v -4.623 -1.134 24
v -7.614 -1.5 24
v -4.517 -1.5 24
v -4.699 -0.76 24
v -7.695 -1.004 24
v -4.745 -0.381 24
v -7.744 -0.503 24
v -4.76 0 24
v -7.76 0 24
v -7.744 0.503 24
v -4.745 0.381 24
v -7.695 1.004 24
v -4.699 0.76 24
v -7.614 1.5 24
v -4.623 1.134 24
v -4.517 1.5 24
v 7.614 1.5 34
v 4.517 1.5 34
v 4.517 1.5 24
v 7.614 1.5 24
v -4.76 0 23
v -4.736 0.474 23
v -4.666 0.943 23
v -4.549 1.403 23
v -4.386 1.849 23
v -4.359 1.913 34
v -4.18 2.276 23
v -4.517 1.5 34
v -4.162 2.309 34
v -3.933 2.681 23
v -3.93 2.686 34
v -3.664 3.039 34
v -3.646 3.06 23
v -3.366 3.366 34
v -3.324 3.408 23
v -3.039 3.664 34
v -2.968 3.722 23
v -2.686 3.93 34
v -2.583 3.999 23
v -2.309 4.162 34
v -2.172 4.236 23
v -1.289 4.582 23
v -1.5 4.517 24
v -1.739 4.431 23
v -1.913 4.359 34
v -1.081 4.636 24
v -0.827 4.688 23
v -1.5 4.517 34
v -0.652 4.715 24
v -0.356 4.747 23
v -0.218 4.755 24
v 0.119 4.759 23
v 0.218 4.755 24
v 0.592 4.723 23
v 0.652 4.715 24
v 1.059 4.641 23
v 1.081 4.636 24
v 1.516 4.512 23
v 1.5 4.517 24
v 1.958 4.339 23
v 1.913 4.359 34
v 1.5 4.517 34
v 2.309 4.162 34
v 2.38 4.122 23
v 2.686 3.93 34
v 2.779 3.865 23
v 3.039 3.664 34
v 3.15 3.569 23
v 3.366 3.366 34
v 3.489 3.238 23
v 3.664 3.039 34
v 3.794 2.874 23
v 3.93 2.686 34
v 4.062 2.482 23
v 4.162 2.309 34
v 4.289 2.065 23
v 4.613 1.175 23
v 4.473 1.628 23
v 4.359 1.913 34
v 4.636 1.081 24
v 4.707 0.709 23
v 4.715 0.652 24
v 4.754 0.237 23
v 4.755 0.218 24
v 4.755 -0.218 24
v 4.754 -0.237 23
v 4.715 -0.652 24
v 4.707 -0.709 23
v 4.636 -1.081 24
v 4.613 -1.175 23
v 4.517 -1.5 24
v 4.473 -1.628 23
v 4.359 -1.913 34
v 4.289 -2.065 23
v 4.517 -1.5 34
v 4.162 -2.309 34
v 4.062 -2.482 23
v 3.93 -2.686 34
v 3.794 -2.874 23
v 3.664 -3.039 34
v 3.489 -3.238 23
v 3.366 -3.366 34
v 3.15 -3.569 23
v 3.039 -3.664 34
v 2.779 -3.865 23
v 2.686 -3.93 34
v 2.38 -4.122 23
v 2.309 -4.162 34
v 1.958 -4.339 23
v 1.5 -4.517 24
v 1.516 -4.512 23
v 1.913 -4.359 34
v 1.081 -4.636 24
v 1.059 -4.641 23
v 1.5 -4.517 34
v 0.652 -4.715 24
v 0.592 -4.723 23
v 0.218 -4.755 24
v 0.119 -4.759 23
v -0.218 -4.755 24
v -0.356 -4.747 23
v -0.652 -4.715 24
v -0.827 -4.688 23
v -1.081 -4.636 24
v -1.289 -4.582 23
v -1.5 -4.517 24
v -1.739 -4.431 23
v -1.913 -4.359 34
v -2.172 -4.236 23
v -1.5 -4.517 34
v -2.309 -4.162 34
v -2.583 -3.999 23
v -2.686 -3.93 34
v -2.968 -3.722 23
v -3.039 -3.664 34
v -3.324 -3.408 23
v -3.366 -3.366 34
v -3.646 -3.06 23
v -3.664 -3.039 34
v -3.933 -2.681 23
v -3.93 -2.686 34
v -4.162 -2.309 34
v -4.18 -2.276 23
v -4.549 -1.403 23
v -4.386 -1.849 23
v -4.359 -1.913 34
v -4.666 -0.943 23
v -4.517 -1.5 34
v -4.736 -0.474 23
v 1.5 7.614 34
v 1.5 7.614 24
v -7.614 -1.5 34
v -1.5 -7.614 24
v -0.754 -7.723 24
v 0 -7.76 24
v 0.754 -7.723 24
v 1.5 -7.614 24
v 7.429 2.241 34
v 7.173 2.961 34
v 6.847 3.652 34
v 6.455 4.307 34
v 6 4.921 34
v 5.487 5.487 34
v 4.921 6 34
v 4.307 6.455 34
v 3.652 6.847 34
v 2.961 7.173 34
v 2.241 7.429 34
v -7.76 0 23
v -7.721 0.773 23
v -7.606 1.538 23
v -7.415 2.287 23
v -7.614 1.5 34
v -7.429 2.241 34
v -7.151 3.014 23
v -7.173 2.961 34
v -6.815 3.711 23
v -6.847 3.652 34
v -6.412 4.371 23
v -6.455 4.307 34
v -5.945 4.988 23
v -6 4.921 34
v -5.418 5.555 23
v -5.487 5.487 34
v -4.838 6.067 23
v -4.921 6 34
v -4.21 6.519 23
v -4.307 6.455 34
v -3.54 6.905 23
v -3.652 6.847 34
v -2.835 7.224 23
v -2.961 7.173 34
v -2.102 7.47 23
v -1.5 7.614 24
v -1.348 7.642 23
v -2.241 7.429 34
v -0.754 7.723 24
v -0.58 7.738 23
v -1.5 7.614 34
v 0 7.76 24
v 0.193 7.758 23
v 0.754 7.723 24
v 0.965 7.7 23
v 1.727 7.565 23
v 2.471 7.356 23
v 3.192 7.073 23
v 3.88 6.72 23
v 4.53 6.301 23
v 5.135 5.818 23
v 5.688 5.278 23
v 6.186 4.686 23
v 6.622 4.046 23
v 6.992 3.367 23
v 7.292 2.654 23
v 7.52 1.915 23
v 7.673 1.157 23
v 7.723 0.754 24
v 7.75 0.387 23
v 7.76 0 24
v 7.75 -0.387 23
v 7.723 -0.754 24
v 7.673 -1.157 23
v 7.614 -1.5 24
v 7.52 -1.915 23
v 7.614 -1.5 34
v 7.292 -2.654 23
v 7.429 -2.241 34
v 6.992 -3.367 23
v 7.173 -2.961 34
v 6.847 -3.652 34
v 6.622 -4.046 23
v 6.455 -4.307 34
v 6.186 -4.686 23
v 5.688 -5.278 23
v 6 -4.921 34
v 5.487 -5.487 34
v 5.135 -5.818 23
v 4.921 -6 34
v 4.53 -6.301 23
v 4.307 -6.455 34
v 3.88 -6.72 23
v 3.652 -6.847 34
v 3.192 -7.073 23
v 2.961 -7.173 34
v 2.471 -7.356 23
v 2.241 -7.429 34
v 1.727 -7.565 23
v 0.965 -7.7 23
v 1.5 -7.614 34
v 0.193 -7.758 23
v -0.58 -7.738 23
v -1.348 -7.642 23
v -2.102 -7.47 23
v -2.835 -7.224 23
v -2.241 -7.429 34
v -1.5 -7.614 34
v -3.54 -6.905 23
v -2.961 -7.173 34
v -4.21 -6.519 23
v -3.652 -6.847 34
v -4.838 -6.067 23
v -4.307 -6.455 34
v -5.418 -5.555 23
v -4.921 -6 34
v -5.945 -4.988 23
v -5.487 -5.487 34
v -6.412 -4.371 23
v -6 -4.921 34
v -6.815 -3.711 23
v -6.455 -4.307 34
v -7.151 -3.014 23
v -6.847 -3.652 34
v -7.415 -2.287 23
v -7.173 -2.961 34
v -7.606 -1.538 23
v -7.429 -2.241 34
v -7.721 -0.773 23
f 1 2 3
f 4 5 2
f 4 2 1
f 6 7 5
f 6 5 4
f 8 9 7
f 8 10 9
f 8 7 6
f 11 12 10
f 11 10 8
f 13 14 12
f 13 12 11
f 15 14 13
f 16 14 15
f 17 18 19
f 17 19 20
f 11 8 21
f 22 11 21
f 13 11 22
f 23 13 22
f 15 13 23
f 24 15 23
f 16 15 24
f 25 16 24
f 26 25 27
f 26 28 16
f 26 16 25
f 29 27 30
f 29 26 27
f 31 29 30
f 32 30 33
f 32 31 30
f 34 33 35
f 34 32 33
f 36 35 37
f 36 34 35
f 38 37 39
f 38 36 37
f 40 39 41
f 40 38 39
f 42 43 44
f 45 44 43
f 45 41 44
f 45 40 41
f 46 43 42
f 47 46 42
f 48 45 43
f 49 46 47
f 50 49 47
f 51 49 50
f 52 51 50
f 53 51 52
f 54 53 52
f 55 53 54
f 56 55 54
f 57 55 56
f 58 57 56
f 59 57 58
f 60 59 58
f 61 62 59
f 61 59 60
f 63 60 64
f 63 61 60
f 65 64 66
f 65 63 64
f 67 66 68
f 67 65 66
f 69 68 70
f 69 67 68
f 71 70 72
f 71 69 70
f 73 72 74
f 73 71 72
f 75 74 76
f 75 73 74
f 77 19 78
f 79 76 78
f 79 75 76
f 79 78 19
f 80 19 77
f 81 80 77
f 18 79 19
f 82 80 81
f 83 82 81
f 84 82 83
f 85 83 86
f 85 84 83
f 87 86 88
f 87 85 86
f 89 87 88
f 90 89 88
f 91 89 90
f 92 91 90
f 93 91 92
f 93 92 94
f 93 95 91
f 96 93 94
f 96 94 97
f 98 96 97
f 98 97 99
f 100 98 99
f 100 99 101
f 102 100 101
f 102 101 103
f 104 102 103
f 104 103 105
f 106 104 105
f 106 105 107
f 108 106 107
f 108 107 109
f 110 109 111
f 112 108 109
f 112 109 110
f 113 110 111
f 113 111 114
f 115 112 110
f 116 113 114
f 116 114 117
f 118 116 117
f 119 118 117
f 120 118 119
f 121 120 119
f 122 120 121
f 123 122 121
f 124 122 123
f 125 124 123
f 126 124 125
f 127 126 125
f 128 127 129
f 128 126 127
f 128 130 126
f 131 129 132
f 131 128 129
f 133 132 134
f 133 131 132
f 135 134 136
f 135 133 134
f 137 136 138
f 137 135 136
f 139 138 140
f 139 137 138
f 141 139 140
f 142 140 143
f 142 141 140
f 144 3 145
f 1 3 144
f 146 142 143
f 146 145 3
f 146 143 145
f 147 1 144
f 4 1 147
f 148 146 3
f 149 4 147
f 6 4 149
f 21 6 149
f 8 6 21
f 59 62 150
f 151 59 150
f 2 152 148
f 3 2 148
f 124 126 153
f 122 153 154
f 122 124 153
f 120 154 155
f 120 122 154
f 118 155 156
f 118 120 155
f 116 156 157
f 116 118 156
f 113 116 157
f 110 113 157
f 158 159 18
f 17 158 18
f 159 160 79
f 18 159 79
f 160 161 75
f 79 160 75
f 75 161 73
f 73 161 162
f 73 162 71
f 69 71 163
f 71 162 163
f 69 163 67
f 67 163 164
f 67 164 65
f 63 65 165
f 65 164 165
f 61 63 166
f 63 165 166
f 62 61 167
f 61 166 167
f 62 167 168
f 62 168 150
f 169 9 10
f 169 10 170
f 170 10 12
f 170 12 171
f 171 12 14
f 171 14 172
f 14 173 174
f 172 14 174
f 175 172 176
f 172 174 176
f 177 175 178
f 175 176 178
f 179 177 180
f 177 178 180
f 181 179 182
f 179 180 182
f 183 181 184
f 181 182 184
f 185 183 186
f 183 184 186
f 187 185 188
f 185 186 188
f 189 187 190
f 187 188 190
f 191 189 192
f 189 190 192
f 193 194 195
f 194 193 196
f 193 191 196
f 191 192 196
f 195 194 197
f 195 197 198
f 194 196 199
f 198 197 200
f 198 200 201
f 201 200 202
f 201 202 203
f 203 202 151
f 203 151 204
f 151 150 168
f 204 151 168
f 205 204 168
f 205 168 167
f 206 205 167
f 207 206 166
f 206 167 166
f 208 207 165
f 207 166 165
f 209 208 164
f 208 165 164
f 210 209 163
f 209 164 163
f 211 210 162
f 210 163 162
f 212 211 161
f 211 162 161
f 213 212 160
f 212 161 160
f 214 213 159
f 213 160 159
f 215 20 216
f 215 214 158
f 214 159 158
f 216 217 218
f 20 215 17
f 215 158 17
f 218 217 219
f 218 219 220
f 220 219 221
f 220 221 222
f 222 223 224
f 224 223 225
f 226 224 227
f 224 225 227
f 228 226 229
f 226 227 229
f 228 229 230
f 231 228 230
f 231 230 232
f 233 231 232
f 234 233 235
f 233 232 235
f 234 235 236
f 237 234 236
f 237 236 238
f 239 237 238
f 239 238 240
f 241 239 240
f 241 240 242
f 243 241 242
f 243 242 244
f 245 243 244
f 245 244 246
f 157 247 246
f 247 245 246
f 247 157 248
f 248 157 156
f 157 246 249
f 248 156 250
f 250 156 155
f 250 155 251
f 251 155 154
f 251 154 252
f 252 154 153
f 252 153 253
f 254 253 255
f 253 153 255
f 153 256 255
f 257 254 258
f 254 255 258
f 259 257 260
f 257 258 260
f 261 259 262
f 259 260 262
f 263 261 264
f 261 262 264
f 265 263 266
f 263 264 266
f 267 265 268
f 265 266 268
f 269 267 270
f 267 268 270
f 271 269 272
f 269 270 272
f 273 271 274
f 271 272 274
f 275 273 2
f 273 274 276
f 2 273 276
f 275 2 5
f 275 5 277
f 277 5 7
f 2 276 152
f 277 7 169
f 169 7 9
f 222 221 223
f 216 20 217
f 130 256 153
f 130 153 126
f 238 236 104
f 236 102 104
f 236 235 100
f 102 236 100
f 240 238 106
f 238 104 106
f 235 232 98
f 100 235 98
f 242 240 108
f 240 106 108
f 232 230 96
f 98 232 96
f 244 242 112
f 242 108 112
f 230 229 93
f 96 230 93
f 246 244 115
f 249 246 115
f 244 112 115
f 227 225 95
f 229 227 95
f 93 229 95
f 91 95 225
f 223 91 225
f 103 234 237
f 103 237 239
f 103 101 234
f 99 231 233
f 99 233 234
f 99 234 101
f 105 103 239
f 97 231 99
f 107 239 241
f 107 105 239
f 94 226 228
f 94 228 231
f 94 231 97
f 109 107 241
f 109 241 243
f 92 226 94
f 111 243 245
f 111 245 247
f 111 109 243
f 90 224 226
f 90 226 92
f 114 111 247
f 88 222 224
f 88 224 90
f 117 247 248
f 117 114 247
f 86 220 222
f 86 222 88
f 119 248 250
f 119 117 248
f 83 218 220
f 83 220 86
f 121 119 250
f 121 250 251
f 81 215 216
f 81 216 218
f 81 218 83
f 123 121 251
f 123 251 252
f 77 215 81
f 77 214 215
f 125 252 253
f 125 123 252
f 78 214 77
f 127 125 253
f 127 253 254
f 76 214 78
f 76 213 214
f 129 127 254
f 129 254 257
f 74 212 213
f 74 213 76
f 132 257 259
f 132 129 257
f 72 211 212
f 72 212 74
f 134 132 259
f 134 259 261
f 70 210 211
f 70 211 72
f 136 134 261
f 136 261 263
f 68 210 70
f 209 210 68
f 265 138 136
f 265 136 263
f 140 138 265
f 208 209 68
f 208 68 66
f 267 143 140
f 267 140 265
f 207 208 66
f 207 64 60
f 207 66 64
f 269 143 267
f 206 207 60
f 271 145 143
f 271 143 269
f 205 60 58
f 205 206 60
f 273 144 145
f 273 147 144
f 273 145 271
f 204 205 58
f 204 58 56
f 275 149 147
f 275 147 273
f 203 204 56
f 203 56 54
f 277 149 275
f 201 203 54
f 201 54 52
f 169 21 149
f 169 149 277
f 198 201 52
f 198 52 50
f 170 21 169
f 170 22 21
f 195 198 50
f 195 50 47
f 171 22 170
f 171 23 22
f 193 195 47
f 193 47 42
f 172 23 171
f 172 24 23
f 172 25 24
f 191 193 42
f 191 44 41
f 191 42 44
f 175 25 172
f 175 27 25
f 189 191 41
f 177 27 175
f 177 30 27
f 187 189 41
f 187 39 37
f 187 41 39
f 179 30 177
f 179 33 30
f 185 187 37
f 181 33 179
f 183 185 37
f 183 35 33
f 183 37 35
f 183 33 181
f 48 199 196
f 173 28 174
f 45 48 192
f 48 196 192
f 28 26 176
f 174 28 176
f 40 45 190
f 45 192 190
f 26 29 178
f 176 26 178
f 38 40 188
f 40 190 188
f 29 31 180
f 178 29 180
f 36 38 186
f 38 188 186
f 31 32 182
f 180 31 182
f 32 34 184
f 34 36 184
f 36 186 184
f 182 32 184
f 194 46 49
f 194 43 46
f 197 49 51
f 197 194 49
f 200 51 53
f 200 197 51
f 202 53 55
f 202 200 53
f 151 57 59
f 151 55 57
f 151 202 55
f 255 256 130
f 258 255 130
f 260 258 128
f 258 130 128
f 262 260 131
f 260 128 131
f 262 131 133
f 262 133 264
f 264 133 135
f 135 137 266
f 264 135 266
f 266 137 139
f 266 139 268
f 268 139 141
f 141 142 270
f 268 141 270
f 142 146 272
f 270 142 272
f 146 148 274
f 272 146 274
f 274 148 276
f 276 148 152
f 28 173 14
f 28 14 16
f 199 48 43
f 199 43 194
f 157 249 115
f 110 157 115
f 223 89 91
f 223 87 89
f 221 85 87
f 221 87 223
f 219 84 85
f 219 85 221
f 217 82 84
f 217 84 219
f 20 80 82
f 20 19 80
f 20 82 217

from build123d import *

# Parameters (mm, degrees)
F0_W     = 3
F0_H     = 11
F2_W     = 3
F2_H     = 5.261537
F2_W_2   = 5.261537
F2_H_2   = 3
F3_DEPTH = 10


with BuildPart() as f1:
    # F0 (on Front) → F1 (revolve)
    with BuildSketch(Plane.XZ):
        with Locations((-6.26, 28.5)):
            Rectangle(F0_W, F0_H)
    revolve(axis=Axis((0, 0, 29.352345), (0, 0, -1)))

    # F2 (on face) → F3 (cut)
    with BuildSketch(Plane.XY.offset(34)):
        with Locations((0, 6.592725)):
            Rectangle(F2_W, F2_H)
        with Locations((-6.592725, 0)):
            Rectangle(F2_W_2, F2_H_2)
        with Locations((0, -6.592725)):
            Rectangle(F2_W, F2_H)
        with Locations((6.592725, 0)):
            Rectangle(F2_W_2, F2_H_2)
    extrude(amount=-F3_DEPTH, mode=Mode.SUBTRACT)


solid = f1.part
